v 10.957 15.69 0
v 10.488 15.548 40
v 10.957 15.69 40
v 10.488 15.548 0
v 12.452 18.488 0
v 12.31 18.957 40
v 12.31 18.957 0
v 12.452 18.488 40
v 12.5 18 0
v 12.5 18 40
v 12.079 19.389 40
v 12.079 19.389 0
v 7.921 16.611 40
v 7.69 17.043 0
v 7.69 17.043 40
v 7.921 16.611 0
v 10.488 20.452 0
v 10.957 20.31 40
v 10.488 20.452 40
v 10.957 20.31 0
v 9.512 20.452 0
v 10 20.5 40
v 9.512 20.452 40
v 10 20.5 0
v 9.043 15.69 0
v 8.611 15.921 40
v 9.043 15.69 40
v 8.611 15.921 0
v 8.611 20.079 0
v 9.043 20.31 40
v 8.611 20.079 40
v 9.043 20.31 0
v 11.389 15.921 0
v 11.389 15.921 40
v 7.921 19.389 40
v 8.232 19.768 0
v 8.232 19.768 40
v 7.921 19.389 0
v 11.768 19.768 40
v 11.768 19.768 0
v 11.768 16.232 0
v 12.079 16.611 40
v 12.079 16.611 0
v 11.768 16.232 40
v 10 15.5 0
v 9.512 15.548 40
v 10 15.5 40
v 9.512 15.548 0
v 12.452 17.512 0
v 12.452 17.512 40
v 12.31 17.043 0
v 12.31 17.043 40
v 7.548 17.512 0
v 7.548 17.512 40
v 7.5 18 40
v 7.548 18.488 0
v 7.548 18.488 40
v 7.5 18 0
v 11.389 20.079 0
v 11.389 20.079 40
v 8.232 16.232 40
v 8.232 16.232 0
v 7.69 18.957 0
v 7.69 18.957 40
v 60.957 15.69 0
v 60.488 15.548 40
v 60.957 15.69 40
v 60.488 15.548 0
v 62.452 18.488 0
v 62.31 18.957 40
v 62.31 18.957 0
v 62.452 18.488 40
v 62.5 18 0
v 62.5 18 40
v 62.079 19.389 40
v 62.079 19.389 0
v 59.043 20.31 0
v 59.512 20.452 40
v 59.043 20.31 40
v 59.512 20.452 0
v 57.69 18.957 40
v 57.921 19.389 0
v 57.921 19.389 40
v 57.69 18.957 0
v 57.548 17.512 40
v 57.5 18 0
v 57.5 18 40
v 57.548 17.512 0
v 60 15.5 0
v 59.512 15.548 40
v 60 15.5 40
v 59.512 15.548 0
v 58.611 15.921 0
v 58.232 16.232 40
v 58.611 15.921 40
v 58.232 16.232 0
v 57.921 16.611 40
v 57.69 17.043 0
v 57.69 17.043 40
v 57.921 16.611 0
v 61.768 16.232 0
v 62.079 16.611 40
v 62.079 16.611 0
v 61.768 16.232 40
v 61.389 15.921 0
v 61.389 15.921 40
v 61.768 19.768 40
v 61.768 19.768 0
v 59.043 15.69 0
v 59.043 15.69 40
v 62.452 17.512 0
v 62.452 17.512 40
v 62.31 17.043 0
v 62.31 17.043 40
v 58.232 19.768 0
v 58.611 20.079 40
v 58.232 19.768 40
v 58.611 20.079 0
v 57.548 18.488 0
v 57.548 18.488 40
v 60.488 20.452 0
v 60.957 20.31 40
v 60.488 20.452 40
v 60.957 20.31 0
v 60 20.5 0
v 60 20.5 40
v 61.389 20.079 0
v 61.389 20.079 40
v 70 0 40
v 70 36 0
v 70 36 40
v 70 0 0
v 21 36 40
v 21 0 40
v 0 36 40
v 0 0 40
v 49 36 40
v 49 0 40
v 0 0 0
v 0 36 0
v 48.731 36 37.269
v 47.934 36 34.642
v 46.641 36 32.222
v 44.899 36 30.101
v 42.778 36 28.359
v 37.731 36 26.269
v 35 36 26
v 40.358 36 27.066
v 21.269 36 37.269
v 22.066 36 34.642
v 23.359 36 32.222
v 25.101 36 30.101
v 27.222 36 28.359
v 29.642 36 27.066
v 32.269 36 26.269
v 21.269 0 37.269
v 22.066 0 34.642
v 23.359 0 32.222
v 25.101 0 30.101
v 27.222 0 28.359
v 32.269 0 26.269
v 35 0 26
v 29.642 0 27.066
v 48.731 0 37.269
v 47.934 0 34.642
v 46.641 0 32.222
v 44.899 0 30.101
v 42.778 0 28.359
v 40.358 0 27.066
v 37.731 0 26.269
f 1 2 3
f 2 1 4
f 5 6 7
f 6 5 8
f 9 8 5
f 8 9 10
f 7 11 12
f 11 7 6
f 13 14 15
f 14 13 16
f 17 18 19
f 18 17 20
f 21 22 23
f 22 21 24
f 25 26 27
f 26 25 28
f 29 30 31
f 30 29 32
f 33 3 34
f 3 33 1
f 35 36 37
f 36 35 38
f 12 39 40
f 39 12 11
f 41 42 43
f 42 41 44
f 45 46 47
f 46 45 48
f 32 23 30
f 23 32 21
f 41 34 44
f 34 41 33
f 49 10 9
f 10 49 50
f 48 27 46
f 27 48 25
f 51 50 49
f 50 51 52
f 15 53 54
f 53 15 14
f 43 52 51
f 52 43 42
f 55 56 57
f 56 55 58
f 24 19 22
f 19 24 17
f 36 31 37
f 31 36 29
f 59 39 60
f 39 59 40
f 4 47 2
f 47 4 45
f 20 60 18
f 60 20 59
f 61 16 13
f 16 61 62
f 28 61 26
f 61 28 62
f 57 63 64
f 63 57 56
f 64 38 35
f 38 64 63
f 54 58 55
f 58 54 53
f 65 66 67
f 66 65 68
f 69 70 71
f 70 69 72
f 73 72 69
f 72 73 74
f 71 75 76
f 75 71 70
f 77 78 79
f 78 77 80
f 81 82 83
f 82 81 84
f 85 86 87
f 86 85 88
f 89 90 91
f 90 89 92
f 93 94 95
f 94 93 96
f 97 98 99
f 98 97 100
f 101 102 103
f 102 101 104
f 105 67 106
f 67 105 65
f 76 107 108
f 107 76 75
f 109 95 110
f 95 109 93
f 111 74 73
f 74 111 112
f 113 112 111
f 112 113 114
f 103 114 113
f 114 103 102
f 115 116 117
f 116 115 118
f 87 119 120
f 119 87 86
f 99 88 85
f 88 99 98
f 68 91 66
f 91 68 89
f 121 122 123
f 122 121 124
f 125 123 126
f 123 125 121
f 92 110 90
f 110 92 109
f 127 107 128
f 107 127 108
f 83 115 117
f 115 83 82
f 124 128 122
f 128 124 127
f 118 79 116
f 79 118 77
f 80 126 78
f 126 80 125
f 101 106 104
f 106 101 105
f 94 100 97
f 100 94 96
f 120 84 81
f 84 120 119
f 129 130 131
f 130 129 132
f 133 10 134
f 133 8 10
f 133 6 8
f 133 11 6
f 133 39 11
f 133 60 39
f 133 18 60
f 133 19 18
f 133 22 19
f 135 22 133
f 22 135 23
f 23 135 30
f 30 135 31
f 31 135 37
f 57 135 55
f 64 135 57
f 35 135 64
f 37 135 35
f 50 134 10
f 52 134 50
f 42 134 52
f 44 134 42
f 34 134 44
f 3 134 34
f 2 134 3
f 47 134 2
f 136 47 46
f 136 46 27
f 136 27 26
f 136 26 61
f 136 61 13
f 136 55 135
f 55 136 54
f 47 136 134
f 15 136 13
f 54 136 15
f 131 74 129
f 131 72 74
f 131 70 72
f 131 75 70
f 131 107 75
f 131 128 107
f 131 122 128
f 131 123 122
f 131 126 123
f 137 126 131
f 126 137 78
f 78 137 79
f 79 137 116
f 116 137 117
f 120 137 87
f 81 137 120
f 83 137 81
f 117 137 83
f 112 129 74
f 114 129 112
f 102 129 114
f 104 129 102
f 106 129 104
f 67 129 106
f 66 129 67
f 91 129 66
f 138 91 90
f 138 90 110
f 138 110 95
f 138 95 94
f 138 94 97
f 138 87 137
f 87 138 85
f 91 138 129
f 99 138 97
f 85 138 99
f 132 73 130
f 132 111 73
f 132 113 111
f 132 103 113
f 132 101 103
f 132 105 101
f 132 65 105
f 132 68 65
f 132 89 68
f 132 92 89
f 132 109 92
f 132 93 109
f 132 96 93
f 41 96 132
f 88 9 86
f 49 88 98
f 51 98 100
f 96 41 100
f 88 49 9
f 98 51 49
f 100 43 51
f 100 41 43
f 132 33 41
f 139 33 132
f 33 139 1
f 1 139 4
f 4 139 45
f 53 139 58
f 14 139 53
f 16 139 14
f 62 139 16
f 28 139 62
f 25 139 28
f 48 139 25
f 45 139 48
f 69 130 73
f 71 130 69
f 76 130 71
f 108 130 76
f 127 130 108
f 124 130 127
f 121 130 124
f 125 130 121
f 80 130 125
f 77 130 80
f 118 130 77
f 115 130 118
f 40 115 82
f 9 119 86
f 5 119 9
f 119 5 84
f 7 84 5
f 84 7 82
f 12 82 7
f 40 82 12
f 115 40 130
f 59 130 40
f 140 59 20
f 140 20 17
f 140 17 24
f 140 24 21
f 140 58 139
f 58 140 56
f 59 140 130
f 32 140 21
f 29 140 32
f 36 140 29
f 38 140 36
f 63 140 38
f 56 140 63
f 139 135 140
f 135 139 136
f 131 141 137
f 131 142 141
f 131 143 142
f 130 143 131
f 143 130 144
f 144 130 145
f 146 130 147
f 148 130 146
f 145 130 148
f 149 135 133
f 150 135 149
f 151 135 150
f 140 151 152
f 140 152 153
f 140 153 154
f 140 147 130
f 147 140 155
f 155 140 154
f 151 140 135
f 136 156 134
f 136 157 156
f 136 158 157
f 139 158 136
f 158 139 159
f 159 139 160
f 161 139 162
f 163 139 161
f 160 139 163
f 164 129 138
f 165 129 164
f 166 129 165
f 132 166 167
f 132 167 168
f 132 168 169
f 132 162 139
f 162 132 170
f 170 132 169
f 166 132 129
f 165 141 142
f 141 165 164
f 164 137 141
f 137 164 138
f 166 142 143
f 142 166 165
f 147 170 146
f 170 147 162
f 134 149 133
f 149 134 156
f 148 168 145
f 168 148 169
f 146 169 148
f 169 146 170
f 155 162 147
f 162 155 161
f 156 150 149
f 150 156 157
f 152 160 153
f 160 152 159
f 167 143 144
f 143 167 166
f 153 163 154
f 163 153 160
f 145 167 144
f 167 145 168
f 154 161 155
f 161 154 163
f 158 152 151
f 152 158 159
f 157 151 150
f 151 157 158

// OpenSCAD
$fn = 32;

// ----------------------------------------------------------------------
// Saddle clamp: plain shaft clamp
// ----------------------------------------------------------------------

// --- parameters (mm) ---
blk_l = 70;               // block length, X
blk_w = 36;               // block width, Y
blk_h = 40;               // block height
clamp_r = 14;             // shaft groove radius
hole_r = 2.5;             // bolt hole radius
hole_m = 10;              // bolt hole margin from the ends

saw_depth = clamp_r + 3;  // saw kerf depth

difference() {
  cube([blk_l, blk_w, blk_h]);
  translate([blk_l / 2, -1, blk_h])
    rotate([-90, 0, 0])
      cylinder(h = blk_w + 2, r = clamp_r);
  for (sx = [0, 1])
    translate([sx ? blk_l - hole_m : hole_m, blk_w / 2, -1])
      cylinder(r = hole_r, h = blk_h + 2);
}
